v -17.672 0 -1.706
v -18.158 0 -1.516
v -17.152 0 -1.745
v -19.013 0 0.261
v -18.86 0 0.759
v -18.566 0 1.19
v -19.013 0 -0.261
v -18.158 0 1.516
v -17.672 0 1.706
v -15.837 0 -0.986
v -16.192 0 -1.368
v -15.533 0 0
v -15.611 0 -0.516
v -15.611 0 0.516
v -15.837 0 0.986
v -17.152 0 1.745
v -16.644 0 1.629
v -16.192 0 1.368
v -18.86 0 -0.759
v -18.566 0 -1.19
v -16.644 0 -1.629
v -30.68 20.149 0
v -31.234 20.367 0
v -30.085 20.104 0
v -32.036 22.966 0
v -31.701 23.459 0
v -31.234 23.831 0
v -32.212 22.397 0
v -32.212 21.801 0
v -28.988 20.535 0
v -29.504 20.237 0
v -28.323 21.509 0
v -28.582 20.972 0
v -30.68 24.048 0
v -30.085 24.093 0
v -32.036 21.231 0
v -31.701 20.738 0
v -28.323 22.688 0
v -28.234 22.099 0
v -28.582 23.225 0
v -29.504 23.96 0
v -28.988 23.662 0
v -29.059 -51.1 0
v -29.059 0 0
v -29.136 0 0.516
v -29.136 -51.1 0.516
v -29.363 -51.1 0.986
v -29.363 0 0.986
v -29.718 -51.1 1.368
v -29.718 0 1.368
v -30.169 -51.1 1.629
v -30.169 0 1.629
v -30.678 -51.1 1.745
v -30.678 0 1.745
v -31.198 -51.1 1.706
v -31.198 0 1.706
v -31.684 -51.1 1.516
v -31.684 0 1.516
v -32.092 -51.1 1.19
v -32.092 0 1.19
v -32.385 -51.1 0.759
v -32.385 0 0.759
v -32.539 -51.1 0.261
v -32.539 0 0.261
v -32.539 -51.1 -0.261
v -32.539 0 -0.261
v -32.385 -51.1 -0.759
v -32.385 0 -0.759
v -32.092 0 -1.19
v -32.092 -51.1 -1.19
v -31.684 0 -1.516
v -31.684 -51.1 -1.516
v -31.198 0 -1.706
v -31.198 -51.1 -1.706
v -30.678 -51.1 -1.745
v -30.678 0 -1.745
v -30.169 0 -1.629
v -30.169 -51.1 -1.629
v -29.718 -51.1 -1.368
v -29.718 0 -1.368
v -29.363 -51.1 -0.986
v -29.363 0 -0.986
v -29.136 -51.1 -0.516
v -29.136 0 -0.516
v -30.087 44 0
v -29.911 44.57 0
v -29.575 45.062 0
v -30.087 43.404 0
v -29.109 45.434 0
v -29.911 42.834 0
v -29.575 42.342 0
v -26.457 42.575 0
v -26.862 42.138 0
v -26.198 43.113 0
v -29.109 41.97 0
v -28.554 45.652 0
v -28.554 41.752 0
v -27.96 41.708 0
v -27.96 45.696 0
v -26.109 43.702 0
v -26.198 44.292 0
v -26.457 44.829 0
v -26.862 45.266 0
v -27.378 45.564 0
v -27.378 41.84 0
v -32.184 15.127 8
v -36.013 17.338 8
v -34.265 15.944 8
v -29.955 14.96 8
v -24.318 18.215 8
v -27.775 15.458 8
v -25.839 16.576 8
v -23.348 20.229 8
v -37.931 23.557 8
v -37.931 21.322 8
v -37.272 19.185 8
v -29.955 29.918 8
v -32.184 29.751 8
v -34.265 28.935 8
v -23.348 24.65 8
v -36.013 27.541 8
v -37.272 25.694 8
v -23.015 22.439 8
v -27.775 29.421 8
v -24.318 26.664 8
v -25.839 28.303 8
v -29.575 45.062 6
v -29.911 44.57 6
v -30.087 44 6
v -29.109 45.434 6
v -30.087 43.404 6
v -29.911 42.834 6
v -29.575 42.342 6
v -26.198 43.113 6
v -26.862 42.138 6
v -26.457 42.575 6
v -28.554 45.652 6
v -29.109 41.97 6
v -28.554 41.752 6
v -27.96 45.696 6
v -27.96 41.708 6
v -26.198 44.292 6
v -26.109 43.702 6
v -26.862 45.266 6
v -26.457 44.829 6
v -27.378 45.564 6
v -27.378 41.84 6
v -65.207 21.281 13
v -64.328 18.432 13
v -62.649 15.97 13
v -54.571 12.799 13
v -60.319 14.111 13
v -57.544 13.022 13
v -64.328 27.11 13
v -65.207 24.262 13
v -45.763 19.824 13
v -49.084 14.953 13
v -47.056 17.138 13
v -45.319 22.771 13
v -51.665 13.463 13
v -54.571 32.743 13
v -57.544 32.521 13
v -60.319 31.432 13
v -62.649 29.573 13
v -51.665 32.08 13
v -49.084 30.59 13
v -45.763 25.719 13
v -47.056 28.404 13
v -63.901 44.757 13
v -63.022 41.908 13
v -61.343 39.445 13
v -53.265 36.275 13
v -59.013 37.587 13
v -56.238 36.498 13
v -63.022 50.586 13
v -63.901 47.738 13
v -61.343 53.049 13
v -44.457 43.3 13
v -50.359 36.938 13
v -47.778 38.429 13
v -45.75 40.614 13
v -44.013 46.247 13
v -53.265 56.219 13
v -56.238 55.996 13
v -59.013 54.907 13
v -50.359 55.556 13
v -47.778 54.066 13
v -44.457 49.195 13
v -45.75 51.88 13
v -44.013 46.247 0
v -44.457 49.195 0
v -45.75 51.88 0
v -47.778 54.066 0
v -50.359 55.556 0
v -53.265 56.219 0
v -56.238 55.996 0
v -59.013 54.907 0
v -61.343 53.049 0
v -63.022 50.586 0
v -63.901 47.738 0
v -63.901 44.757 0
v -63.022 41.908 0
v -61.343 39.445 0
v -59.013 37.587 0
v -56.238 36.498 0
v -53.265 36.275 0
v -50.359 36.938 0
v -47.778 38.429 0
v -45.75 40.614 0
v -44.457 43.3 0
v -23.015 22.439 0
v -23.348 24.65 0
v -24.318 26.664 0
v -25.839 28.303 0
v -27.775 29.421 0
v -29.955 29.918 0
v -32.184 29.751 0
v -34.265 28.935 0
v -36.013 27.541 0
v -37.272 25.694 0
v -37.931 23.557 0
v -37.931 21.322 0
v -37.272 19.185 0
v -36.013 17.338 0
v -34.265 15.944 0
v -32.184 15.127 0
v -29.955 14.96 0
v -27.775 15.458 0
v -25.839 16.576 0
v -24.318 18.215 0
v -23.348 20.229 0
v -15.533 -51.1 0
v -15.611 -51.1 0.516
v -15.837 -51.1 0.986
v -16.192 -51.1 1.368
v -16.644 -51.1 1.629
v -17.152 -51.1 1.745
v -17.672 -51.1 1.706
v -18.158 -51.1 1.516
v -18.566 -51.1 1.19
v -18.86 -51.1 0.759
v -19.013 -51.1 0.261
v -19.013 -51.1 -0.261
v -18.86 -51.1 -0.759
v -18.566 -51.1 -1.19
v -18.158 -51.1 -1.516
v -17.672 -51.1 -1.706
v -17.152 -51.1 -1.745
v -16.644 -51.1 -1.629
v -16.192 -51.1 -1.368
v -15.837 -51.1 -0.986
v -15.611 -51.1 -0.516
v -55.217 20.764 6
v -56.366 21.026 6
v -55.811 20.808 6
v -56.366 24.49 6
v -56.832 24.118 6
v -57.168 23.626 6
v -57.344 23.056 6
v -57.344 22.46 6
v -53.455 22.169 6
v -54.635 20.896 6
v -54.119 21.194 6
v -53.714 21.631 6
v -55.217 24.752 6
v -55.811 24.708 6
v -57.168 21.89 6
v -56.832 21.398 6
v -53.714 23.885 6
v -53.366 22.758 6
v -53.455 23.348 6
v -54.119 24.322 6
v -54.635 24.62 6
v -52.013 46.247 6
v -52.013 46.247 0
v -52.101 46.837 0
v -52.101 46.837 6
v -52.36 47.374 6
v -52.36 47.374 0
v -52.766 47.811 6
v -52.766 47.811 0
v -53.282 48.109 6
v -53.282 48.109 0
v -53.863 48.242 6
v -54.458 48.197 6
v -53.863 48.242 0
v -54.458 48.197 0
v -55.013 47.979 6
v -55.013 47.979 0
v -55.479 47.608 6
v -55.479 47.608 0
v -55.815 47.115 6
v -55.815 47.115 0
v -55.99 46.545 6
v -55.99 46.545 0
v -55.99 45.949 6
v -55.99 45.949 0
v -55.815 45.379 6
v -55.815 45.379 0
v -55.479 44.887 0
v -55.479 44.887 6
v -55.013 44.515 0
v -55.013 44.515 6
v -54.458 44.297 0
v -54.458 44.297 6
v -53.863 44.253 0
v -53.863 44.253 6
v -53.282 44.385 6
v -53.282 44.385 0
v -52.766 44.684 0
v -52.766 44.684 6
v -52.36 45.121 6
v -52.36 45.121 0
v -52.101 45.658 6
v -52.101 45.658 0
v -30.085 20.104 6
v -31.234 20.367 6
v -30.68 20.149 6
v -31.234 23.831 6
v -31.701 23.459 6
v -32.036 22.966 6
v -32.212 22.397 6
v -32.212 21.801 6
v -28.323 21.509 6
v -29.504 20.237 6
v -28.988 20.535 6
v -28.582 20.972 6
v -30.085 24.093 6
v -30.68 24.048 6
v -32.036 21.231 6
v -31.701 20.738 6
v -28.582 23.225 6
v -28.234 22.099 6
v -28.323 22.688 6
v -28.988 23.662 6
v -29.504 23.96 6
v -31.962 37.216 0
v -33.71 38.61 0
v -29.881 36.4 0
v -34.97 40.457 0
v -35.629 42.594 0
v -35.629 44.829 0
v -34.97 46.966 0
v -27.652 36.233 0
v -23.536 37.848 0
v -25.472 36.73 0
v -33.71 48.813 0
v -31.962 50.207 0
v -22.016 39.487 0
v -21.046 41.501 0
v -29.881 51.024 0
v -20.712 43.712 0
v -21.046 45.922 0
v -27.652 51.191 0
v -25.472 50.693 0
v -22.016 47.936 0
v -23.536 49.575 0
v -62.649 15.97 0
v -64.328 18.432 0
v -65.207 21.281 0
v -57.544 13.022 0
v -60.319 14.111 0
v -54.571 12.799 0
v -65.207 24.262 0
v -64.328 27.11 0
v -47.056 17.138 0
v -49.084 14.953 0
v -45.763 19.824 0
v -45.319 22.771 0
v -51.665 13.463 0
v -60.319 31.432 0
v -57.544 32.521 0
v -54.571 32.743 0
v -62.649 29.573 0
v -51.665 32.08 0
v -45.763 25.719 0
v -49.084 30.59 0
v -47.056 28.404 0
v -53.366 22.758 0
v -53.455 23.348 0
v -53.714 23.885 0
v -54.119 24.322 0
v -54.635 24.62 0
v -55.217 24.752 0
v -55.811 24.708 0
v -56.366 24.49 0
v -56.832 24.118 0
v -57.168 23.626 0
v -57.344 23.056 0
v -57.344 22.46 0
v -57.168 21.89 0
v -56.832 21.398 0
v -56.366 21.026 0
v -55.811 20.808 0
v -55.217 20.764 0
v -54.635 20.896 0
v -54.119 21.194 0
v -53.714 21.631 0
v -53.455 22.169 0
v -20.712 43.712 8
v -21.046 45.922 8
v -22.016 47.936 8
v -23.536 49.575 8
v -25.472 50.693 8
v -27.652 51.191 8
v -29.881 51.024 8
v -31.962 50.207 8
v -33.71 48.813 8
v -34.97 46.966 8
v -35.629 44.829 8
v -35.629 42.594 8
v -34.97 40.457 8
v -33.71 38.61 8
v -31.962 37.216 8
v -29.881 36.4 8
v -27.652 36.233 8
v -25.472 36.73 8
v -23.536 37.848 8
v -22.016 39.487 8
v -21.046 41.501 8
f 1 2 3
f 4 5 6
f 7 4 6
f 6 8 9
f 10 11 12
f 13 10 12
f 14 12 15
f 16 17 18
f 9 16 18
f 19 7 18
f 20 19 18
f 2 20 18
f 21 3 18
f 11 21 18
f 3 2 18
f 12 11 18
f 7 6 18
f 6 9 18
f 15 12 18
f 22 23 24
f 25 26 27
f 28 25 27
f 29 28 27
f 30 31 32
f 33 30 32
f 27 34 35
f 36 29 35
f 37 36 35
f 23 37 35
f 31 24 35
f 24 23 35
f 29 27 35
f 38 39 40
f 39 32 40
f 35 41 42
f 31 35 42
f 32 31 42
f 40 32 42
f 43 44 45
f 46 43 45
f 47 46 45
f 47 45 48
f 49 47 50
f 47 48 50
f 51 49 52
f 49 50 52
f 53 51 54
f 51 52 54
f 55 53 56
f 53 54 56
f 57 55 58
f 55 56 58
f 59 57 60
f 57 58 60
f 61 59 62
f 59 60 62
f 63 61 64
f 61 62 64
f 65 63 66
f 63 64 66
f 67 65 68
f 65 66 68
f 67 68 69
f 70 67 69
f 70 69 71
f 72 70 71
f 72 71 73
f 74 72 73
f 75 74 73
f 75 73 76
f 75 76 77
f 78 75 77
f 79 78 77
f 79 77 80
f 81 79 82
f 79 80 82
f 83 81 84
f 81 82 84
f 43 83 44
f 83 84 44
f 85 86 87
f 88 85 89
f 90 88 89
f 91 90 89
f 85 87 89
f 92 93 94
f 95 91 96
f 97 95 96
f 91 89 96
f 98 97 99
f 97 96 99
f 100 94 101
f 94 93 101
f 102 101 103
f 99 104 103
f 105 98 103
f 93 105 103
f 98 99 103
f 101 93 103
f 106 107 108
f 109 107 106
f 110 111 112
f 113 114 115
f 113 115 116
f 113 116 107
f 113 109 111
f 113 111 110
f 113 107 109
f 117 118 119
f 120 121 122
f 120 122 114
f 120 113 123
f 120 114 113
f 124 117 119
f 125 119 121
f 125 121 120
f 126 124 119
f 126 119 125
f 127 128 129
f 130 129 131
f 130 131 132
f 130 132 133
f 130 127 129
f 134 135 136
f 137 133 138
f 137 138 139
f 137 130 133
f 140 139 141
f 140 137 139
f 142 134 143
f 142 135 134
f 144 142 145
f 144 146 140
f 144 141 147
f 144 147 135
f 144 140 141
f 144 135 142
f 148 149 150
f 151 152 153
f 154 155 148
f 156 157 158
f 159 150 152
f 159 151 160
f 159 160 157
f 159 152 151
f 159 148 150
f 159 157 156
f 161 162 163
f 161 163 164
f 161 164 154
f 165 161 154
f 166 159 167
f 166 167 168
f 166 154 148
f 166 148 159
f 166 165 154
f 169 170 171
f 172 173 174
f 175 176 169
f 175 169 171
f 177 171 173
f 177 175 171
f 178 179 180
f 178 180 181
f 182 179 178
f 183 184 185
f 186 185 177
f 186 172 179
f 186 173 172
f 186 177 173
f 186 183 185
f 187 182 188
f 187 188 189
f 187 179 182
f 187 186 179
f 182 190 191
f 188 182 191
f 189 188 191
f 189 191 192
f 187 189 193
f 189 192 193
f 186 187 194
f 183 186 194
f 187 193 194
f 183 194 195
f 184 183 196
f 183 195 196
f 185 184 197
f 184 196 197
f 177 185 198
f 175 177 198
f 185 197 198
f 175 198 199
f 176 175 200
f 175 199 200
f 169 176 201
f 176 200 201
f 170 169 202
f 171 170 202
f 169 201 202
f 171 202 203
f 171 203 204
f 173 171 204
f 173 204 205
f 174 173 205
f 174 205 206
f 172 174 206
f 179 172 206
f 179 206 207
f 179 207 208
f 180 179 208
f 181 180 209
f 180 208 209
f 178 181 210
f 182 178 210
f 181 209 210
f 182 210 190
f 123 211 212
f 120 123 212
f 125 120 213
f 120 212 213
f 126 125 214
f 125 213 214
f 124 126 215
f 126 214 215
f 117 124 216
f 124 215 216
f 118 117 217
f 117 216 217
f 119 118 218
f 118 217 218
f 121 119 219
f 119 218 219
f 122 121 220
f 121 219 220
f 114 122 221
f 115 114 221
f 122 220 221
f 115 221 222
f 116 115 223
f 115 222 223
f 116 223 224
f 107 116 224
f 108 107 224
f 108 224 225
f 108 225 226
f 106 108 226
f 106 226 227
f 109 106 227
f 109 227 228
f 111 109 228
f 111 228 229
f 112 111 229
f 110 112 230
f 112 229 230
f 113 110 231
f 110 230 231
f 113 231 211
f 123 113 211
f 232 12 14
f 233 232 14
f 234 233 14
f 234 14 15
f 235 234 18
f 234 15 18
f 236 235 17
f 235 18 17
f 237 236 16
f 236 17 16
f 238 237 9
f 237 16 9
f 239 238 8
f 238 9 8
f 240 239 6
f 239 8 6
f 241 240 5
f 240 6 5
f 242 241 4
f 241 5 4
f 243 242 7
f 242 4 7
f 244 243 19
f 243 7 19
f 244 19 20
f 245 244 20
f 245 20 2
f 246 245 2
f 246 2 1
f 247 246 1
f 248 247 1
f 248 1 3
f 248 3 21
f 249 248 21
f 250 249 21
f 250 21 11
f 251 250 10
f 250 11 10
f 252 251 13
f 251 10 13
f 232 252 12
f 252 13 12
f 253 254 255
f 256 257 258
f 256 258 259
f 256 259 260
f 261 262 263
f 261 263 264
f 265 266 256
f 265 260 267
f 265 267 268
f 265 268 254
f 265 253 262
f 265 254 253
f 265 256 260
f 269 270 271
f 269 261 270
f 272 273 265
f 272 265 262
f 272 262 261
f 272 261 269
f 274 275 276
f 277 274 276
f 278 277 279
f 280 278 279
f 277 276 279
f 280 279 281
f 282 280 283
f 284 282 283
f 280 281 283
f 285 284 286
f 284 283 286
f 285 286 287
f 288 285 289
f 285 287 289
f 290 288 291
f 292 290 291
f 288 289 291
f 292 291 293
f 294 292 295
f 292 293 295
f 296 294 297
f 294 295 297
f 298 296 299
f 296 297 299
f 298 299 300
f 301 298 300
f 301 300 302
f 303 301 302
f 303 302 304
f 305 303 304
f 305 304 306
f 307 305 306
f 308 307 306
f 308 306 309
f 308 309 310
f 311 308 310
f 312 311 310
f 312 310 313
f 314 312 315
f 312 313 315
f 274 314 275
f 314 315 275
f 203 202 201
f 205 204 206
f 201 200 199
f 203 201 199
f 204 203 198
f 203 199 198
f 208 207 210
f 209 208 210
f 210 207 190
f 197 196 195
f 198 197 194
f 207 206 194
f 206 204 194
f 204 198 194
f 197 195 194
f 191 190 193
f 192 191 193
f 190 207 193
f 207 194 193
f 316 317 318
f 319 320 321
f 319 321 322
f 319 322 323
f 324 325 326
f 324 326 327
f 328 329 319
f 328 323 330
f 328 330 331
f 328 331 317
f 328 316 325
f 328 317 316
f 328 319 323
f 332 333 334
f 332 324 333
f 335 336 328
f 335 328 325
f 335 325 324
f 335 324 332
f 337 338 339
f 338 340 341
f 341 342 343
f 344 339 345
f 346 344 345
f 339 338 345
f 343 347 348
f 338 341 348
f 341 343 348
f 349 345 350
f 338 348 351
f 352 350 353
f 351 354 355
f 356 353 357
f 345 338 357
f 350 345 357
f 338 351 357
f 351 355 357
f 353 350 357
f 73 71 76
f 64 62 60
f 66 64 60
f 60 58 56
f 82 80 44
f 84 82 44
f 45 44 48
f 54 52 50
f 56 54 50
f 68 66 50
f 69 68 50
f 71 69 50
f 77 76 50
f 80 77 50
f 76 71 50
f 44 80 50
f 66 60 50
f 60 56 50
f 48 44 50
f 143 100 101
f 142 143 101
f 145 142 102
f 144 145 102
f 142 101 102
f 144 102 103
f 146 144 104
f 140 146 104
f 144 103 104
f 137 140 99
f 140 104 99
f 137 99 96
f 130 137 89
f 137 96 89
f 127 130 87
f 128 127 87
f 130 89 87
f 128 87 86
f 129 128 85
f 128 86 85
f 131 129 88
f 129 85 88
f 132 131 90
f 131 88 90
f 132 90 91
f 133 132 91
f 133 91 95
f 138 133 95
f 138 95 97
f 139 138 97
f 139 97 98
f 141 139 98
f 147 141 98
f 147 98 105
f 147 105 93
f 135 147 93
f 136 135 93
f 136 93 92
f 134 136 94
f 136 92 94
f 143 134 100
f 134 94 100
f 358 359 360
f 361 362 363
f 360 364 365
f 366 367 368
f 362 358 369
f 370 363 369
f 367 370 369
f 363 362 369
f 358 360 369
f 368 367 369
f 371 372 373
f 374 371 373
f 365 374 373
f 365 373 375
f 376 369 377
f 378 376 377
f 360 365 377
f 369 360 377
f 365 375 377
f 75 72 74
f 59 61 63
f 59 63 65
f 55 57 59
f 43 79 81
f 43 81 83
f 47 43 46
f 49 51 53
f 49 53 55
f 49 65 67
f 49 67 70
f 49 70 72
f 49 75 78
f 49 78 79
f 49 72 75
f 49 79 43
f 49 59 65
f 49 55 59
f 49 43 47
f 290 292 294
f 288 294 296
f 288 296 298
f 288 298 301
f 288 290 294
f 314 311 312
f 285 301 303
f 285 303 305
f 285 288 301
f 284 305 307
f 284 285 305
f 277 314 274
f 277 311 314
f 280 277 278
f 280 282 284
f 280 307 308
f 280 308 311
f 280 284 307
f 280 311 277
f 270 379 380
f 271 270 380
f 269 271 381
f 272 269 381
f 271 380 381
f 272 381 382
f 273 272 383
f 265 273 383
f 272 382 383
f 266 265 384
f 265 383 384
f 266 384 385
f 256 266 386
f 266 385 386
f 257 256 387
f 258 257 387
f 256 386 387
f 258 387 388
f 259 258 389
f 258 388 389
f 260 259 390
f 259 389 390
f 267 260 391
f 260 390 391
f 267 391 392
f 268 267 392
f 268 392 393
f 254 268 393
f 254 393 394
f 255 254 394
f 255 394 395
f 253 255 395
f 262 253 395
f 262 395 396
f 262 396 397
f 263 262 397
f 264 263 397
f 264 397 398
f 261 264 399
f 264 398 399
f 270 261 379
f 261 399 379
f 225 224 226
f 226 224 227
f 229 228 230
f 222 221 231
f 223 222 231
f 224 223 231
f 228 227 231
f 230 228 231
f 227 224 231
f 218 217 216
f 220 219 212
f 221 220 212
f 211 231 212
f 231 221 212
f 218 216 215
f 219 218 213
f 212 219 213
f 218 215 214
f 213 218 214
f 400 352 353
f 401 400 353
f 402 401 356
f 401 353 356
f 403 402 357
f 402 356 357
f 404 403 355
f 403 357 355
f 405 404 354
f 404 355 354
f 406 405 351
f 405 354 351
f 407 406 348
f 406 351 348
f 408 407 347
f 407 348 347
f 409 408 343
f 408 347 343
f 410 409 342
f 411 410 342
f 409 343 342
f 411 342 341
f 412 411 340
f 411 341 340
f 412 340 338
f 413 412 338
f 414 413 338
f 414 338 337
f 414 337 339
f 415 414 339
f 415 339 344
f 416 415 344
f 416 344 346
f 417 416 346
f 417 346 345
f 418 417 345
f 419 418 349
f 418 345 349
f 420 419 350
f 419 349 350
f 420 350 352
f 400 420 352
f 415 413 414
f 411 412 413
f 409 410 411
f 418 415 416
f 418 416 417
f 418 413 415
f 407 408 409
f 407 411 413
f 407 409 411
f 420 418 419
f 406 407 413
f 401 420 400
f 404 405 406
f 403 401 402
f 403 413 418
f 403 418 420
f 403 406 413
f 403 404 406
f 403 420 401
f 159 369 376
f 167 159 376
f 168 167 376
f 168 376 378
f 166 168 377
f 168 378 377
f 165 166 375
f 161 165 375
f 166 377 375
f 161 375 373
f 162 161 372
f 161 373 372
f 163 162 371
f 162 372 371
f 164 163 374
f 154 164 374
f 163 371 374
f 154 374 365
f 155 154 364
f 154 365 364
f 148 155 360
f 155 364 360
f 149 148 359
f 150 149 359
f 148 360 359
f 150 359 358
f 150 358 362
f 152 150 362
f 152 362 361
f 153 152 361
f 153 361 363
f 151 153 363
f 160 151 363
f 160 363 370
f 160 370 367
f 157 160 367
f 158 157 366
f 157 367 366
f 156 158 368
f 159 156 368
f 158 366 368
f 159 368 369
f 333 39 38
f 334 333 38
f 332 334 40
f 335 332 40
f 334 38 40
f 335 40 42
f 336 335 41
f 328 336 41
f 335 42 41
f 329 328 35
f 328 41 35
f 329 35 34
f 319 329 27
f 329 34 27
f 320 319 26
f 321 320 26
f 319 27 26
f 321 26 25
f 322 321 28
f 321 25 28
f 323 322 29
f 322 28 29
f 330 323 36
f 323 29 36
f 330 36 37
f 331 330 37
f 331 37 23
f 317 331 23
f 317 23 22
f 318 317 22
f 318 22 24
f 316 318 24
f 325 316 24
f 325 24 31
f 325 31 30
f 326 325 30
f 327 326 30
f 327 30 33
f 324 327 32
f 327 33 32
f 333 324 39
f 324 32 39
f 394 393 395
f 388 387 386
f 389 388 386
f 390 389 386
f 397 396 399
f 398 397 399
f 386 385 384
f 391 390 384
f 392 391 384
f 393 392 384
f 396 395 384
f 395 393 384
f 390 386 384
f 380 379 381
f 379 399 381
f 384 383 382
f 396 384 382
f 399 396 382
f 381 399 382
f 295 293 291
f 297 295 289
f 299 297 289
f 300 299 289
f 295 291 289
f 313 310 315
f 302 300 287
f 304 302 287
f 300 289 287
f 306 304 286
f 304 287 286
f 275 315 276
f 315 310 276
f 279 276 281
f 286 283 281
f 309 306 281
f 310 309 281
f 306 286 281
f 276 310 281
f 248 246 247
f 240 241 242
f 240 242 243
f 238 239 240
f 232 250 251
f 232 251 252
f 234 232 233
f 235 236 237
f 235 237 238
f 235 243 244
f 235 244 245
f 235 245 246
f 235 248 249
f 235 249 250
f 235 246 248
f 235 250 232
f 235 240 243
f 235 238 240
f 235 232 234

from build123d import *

# Parameters (mm, degrees)
F0_R     = 1.75
F1_DEPTH = 51.1
F2_R     = 7.5
F3_DEPTH = 8
F4_R     = 10
F5_DEPTH = 13
F7_R     = 1.75
F8_DEPTH = 51.1
F6_R     = 2
F9_DEPTH = 6


with BuildPart() as f1:
    # F0 (on Front) → F1 (new body)
    with BuildSketch(Plane.XZ):
        with Locations((-17.28292, 0)):
            Circle(F0_R)
    extrude(amount=F1_DEPTH)


with BuildPart() as f3:
    # F2 (on Top) → F3 (new body)
    with BuildSketch(Plane.XY):
        with Locations((-30.515021, 22.439414)):
            Circle(F2_R)
        with Locations((-28.212463, 43.711599)):
            Circle(F2_R)
    extrude(amount=F3_DEPTH)


with BuildPart() as f5:
    # F4 (on Top) → F5 (new body)
    with BuildSketch(Plane.XY):
        with Locations((-54.012599, 46.247213)):
            Circle(F4_R)
        with Locations((-55.318636, 22.77125)):
            Circle(F4_R)
    extrude(amount=F5_DEPTH)


with BuildPart() as f8:
    # F7 (on Front) → F8 (new body)
    with BuildSketch(Plane.XZ):
        with Locations((-30.808685, 0)):
            Circle(F7_R)
    extrude(amount=F8_DEPTH)


with BuildPart() as f9:
    # F6 (on Top) → F9 (new body)
    with BuildSketch(Plane.XY):
        with Locations((-54.012599, 46.247213)):
            Circle(F6_R)
        with Locations((-28.10913, 43.702018)):
            Circle(F6_R)
        with Locations((-30.234499, 22.098629)):
            Circle(F6_R)
        with Locations((-55.366088, 22.758037)):
            Circle(F6_R)
    extrude(amount=F9_DEPTH)


solid = Compound([f1.part, f3.part, f5.part, f8.part, f9.part])
